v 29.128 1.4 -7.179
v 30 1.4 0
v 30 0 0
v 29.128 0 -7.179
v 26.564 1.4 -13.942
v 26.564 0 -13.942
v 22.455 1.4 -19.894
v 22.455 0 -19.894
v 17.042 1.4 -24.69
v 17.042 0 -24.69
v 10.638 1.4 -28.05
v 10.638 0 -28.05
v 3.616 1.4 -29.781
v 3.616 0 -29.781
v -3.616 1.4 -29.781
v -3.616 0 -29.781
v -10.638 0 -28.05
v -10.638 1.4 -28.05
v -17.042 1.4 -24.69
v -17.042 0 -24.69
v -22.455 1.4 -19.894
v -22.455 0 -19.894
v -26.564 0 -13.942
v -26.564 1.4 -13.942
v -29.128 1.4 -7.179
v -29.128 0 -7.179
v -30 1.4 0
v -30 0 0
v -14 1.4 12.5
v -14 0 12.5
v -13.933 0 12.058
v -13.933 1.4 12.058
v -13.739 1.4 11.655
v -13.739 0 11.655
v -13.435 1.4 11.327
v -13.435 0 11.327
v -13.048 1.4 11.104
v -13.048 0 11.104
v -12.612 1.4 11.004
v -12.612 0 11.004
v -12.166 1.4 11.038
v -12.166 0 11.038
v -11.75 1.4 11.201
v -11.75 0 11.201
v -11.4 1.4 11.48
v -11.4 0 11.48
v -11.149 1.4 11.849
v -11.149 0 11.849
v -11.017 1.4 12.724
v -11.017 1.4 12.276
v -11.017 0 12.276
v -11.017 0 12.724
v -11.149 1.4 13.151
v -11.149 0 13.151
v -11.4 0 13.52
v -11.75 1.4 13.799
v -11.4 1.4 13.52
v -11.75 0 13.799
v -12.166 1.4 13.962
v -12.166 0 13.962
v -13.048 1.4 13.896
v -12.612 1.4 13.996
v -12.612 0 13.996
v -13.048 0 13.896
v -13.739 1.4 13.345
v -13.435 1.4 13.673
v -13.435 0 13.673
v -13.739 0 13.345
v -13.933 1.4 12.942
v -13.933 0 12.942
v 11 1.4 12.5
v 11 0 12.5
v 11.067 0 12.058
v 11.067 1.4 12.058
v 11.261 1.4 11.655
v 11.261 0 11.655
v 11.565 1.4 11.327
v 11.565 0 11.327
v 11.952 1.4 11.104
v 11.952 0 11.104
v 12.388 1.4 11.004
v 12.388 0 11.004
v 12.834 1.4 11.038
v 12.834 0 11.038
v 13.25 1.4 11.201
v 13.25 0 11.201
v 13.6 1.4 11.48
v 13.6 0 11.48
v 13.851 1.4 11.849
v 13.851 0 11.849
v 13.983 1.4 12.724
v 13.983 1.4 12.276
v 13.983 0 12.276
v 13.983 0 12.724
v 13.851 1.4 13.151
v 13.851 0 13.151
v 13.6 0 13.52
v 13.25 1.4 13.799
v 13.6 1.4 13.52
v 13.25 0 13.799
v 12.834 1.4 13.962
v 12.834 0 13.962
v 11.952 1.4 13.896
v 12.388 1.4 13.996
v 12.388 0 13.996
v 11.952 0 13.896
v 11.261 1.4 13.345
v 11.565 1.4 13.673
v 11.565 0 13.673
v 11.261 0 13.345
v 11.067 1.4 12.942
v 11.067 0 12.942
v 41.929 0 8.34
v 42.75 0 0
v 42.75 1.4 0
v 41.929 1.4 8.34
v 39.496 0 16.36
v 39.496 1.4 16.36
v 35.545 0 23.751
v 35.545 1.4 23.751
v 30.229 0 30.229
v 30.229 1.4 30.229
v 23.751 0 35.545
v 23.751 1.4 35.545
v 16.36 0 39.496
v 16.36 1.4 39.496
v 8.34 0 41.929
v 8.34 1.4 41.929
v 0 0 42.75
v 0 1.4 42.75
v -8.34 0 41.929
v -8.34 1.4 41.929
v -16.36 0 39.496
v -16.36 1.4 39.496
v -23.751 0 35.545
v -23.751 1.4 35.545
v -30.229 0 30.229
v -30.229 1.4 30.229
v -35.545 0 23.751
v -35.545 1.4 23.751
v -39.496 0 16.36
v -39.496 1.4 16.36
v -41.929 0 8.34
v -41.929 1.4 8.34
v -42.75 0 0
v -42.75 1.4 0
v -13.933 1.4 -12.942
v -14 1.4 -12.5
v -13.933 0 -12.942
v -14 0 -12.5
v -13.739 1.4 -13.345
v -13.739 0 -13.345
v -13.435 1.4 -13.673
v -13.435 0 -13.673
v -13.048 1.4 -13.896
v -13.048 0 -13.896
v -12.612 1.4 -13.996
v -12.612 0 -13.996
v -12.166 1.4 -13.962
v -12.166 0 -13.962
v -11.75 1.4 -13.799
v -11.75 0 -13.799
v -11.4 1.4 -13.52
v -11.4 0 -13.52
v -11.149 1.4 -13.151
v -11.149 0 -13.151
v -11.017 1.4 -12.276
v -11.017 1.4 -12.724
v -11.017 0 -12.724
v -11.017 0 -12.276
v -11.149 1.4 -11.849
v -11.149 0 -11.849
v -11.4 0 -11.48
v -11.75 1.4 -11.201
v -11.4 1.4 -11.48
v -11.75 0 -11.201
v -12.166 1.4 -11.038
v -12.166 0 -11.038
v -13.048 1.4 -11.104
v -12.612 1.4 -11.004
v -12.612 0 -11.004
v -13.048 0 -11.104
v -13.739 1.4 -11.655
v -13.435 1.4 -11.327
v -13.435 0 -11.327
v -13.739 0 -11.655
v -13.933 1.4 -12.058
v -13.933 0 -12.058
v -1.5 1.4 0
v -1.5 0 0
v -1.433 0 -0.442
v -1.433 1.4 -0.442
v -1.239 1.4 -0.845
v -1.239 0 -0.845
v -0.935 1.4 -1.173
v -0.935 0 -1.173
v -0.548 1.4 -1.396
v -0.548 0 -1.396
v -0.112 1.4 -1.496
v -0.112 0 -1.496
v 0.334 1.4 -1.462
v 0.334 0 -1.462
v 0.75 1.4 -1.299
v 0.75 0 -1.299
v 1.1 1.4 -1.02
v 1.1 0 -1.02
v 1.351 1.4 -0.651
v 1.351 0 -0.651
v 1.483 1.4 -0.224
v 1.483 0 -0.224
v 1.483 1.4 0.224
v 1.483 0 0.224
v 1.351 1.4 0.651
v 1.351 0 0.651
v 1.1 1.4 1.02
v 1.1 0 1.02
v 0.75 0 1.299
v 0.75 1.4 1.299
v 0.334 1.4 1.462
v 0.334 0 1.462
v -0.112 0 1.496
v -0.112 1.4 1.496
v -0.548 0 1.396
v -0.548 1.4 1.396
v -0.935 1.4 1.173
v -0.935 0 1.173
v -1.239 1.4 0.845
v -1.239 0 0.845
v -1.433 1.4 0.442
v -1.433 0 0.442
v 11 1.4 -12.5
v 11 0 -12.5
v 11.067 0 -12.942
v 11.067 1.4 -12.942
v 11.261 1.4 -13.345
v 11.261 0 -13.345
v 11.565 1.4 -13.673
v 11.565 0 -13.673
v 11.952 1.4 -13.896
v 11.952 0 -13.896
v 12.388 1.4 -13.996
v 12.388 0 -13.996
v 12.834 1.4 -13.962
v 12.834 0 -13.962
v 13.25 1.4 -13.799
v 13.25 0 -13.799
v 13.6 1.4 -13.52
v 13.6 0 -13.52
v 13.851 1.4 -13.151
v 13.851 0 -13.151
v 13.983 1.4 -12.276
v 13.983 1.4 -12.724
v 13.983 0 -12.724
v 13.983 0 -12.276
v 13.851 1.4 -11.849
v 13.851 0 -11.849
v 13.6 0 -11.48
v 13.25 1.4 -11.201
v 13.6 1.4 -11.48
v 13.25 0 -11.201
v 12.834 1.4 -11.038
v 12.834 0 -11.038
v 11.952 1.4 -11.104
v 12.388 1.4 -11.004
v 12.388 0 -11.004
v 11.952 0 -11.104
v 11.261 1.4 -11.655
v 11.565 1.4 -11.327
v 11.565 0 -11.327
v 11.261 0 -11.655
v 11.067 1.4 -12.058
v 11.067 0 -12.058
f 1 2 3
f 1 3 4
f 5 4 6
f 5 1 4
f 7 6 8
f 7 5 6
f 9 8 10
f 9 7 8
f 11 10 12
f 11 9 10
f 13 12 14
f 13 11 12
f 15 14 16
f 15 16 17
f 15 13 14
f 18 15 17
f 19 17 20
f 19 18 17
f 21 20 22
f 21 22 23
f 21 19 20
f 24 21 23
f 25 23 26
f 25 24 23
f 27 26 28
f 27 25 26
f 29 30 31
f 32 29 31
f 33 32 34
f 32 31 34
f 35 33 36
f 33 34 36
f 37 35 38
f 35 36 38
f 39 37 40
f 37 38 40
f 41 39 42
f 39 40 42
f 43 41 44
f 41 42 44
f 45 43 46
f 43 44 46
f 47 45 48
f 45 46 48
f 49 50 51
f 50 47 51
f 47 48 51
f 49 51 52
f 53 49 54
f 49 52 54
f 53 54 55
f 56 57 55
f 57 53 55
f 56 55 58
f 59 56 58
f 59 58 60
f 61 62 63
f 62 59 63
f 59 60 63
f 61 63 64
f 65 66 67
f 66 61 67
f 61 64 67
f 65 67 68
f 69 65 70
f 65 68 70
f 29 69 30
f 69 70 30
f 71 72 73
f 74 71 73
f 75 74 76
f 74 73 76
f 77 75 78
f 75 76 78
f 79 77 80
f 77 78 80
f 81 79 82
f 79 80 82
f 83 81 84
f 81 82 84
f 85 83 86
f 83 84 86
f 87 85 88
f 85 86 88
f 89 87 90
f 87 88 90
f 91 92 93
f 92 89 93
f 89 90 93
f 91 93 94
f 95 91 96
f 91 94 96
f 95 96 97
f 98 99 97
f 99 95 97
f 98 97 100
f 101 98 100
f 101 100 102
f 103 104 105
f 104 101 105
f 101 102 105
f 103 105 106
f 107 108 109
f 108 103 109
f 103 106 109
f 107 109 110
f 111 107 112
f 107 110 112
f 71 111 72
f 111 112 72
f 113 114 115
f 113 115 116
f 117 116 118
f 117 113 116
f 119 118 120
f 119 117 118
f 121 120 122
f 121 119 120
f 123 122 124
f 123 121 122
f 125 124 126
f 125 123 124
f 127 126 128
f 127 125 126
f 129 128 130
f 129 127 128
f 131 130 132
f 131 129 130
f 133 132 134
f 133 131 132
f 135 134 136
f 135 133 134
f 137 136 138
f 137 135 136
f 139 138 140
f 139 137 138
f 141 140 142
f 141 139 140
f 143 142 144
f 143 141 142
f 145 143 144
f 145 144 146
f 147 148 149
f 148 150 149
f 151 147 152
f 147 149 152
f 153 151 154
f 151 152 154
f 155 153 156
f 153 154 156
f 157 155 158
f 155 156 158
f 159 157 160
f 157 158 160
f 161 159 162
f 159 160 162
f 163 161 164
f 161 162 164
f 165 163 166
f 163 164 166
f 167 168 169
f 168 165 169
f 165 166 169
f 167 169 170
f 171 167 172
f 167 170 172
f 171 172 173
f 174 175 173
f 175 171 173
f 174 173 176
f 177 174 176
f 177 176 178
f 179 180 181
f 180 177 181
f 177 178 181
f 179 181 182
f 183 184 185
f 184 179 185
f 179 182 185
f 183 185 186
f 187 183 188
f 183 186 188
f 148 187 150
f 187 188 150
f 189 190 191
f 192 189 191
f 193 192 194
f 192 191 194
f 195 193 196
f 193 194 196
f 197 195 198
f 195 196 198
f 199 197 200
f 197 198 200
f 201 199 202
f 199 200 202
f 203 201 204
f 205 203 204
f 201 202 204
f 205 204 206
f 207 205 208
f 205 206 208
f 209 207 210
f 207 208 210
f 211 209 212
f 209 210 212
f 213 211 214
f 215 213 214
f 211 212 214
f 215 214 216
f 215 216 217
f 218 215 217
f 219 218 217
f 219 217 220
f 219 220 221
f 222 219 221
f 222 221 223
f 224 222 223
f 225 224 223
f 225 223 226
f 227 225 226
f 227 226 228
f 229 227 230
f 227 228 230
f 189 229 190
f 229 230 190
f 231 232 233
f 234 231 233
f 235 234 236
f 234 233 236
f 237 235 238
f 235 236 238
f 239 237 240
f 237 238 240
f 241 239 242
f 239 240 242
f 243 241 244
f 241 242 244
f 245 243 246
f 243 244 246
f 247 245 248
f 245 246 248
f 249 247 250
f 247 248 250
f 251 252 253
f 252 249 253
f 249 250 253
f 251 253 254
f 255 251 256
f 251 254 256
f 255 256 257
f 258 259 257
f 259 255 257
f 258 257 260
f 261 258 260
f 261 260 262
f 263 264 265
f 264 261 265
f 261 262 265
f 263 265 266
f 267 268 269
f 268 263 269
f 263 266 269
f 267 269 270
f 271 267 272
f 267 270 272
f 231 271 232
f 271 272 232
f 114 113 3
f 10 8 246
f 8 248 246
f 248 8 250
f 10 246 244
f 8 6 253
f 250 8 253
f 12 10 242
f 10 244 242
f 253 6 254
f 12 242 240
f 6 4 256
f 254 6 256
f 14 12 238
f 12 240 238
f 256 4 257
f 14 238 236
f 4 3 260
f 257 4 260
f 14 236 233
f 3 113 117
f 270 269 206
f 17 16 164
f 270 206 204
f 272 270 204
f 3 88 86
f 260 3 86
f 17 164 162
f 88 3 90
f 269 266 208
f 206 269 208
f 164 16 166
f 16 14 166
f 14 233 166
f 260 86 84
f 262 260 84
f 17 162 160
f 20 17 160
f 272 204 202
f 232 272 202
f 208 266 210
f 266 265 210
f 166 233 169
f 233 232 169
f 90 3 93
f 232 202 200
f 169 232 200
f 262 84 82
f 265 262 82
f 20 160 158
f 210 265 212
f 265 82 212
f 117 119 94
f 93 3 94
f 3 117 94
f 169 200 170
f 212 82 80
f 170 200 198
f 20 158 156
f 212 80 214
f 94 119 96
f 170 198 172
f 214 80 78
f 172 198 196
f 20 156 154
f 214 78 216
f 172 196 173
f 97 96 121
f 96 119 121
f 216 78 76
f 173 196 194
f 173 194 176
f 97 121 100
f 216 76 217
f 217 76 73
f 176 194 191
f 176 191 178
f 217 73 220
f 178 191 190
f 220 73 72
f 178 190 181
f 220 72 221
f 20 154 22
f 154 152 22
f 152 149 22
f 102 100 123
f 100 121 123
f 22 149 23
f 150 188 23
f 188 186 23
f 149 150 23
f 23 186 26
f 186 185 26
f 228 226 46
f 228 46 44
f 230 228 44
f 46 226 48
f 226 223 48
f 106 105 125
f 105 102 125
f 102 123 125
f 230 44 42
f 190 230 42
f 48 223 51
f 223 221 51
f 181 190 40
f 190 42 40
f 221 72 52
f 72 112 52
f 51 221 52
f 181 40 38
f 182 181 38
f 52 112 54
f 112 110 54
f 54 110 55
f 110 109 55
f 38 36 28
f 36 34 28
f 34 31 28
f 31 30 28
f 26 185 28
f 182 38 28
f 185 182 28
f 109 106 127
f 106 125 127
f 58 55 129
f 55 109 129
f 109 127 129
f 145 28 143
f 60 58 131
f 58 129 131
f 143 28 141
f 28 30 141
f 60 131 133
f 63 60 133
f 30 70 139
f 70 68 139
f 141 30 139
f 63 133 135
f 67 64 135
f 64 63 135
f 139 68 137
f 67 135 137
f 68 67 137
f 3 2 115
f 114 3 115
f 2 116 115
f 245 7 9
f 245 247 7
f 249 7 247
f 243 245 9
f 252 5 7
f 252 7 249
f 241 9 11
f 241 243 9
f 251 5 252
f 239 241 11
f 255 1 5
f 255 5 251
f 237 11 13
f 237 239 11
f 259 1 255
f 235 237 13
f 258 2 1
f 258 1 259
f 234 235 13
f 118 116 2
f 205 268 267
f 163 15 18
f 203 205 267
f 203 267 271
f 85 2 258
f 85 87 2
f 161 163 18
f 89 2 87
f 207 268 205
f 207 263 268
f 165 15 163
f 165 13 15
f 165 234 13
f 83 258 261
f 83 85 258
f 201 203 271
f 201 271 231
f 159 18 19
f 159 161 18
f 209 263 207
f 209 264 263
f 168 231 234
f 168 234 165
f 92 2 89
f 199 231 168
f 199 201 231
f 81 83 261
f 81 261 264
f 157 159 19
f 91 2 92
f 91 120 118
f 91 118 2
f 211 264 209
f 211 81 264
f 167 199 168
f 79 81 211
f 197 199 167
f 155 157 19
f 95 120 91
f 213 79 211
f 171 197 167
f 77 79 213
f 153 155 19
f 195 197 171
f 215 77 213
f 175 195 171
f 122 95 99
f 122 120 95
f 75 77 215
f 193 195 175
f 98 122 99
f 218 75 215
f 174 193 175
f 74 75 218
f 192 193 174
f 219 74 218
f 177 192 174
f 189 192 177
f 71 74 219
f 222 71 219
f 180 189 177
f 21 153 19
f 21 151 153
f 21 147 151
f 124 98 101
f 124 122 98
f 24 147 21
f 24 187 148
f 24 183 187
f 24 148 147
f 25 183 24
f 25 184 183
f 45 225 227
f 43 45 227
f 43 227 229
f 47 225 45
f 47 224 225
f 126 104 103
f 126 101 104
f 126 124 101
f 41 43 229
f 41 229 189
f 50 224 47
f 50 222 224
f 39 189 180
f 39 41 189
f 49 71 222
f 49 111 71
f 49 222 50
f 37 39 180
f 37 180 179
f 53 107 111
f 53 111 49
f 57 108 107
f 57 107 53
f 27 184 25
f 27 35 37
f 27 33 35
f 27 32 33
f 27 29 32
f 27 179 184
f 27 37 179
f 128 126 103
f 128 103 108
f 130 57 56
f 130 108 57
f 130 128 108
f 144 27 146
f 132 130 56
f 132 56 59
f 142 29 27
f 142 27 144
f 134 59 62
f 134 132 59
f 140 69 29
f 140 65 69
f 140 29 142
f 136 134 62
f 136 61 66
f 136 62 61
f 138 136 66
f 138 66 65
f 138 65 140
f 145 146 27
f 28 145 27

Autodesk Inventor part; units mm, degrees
ref_plane "YZ Plane" through (0, 0, 0) normal (1, 0, 0) x (0, 1, 0)
ref_plane "XZ Plane" through (0, 0, 0) normal (0, 1, 0) x (-1, 0, 0)
ref_plane "XY Plane" through (0, 0, 0) normal (0, 0, 1) x (1, 0, 0)
sketch "Sketch1" plane through (0, 0, 0) normal (0, 1, 0) x (-1, 0, 0)
  line L0 (59.85, 0) -> (-59.85, 0) projected
  line L1 (0, -59.85) -> (0, 59.85) projected
  circle A0 centre (0, 0) radius 42.75
  line L2 (12.5, 12.5) -> (-12.5, 12.5) construction
  line L3 (-12.5, 12.5) -> (-12.5, -12.5) construction
  line L4 (-12.5, -12.5) -> (12.5, -12.5) construction
  line L5 (12.5, -12.5) -> (12.5, 12.5) construction
  circle A1 centre (12.5, 12.5) radius 1.5
  circle A2 centre (-12.5, 12.5) radius 1.5
  circle A3 centre (12.5, -12.5) radius 1.5
  circle A4 centre (-12.5, -12.5) radius 1.5
  circle A5 centre (0, 0) radius 1.5
  dimension "d0" = 85.5
  dimension "d1" = 25
  dimension "d2" = 25
  dimension "d3" = 12.5
  dimension "d4" = 12.5
  dimension "d5" = 3
  dimension "d8" = 25
  dimension "d11" = 25
  dimension "d16" = 3
extrude "Extrusion2" add sketch "Sketch1" along normal blind 1.4 contours A0 L1 A5 L0 | L0 A5 L1 A0 | L1 A5 L0 A0 | A0 L0 A5 L1
sketch "Sketch2" plane through (0, 1.4, 0) normal (0, 1, 0) x (1, 0, 0)
  circle A0 centre (0, 0) radius 1.5 projected
  arc A1 (30, 0) -> (-30, 0) centre (0, 0) ccw
  line L0 (-59.85, 0) -> (59.85, 0) projected
  line L1 (0, 59.85) -> (0, -59.85) projected
  arc A2 (42.75, 0) -> (-42.75, 0) centre (0, 0) ccw
  line L2 (-30, 0) -> (-42.75, 0)
  line L3 (30, 0) -> (42.75, 0)
  dimension "d19" = 60
  dimension "d20" = 85.5
extrude "Extrusion3" cut sketch "Sketch2" against normal blind 10 contours A1 L1 A2 L0 | A1 L0 A2 L1
equation "\"d2\" = d1"
equation "\"d3\" = 0.5 * d1"
equation "\"d4\" = 0.5 * d1"
properties part number "PanTilt_Base"
